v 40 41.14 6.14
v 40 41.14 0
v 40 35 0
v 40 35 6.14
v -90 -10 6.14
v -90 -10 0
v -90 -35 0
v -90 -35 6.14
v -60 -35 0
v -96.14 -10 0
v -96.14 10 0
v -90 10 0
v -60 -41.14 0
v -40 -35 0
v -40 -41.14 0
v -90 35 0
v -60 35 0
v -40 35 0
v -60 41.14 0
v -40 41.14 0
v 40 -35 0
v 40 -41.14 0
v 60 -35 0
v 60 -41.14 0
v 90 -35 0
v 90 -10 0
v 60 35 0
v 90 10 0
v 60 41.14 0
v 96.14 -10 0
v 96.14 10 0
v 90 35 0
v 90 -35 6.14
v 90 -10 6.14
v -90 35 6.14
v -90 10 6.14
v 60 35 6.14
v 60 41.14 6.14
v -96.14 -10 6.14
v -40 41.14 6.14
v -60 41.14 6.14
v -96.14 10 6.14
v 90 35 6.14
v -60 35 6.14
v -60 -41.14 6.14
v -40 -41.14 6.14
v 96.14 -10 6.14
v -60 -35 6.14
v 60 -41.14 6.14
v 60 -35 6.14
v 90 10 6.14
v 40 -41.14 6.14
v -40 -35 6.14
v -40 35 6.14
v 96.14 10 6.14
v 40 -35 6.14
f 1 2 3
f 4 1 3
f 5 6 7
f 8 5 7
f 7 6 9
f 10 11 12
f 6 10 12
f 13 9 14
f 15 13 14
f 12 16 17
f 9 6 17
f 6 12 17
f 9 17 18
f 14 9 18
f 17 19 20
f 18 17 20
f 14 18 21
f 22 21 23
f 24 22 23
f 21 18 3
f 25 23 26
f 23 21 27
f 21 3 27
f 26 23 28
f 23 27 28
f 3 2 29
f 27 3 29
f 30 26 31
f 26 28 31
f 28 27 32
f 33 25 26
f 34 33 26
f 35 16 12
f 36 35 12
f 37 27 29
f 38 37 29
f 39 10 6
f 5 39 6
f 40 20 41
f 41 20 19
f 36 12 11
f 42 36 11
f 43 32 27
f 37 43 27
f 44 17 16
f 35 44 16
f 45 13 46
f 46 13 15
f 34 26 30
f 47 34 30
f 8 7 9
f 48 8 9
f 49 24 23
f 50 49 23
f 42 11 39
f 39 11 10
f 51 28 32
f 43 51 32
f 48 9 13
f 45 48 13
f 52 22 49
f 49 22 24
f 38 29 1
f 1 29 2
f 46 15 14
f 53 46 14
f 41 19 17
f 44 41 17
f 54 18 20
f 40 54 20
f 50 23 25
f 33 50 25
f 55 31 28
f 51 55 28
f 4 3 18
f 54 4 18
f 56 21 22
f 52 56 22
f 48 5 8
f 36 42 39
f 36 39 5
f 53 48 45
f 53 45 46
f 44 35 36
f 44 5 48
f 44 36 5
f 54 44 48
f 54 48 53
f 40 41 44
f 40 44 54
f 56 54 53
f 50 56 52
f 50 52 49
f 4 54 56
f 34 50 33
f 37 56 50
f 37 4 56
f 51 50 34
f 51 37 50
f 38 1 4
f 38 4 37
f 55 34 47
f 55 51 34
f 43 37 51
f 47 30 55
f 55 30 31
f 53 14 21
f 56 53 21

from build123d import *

# Parameters (mm, degrees)
F2_DEPTH = 6.14


# Not quite as in the source:
# - a feature names something its author has since deleted; it is built from what else it names


with BuildPart() as f2:
    # F1 (on Top) → F2 (new body)
    with BuildSketch(Plane.XY):
        Polygon((90, 10), (90, 35), (60, 35), (60, 41.14), (40, 41.14), (40, 35), (-40, 35), (-40, 41.14), (-60, 41.14), (-60, 35), (-90, 35), (-90, 10), (-96.14, 10), (-96.14, -10), (-90, -10), (-90, -35), (-60, -35), (-60, -41.14), (-40, -41.14), (-40, -35), (40, -35), (40, -41.14), (60, -41.14), (60, -35), (90, -35), (90, -10), (96.14, -10), (96.14, 10), align=None)
    extrude(amount=F2_DEPTH)


solid = f2.part
